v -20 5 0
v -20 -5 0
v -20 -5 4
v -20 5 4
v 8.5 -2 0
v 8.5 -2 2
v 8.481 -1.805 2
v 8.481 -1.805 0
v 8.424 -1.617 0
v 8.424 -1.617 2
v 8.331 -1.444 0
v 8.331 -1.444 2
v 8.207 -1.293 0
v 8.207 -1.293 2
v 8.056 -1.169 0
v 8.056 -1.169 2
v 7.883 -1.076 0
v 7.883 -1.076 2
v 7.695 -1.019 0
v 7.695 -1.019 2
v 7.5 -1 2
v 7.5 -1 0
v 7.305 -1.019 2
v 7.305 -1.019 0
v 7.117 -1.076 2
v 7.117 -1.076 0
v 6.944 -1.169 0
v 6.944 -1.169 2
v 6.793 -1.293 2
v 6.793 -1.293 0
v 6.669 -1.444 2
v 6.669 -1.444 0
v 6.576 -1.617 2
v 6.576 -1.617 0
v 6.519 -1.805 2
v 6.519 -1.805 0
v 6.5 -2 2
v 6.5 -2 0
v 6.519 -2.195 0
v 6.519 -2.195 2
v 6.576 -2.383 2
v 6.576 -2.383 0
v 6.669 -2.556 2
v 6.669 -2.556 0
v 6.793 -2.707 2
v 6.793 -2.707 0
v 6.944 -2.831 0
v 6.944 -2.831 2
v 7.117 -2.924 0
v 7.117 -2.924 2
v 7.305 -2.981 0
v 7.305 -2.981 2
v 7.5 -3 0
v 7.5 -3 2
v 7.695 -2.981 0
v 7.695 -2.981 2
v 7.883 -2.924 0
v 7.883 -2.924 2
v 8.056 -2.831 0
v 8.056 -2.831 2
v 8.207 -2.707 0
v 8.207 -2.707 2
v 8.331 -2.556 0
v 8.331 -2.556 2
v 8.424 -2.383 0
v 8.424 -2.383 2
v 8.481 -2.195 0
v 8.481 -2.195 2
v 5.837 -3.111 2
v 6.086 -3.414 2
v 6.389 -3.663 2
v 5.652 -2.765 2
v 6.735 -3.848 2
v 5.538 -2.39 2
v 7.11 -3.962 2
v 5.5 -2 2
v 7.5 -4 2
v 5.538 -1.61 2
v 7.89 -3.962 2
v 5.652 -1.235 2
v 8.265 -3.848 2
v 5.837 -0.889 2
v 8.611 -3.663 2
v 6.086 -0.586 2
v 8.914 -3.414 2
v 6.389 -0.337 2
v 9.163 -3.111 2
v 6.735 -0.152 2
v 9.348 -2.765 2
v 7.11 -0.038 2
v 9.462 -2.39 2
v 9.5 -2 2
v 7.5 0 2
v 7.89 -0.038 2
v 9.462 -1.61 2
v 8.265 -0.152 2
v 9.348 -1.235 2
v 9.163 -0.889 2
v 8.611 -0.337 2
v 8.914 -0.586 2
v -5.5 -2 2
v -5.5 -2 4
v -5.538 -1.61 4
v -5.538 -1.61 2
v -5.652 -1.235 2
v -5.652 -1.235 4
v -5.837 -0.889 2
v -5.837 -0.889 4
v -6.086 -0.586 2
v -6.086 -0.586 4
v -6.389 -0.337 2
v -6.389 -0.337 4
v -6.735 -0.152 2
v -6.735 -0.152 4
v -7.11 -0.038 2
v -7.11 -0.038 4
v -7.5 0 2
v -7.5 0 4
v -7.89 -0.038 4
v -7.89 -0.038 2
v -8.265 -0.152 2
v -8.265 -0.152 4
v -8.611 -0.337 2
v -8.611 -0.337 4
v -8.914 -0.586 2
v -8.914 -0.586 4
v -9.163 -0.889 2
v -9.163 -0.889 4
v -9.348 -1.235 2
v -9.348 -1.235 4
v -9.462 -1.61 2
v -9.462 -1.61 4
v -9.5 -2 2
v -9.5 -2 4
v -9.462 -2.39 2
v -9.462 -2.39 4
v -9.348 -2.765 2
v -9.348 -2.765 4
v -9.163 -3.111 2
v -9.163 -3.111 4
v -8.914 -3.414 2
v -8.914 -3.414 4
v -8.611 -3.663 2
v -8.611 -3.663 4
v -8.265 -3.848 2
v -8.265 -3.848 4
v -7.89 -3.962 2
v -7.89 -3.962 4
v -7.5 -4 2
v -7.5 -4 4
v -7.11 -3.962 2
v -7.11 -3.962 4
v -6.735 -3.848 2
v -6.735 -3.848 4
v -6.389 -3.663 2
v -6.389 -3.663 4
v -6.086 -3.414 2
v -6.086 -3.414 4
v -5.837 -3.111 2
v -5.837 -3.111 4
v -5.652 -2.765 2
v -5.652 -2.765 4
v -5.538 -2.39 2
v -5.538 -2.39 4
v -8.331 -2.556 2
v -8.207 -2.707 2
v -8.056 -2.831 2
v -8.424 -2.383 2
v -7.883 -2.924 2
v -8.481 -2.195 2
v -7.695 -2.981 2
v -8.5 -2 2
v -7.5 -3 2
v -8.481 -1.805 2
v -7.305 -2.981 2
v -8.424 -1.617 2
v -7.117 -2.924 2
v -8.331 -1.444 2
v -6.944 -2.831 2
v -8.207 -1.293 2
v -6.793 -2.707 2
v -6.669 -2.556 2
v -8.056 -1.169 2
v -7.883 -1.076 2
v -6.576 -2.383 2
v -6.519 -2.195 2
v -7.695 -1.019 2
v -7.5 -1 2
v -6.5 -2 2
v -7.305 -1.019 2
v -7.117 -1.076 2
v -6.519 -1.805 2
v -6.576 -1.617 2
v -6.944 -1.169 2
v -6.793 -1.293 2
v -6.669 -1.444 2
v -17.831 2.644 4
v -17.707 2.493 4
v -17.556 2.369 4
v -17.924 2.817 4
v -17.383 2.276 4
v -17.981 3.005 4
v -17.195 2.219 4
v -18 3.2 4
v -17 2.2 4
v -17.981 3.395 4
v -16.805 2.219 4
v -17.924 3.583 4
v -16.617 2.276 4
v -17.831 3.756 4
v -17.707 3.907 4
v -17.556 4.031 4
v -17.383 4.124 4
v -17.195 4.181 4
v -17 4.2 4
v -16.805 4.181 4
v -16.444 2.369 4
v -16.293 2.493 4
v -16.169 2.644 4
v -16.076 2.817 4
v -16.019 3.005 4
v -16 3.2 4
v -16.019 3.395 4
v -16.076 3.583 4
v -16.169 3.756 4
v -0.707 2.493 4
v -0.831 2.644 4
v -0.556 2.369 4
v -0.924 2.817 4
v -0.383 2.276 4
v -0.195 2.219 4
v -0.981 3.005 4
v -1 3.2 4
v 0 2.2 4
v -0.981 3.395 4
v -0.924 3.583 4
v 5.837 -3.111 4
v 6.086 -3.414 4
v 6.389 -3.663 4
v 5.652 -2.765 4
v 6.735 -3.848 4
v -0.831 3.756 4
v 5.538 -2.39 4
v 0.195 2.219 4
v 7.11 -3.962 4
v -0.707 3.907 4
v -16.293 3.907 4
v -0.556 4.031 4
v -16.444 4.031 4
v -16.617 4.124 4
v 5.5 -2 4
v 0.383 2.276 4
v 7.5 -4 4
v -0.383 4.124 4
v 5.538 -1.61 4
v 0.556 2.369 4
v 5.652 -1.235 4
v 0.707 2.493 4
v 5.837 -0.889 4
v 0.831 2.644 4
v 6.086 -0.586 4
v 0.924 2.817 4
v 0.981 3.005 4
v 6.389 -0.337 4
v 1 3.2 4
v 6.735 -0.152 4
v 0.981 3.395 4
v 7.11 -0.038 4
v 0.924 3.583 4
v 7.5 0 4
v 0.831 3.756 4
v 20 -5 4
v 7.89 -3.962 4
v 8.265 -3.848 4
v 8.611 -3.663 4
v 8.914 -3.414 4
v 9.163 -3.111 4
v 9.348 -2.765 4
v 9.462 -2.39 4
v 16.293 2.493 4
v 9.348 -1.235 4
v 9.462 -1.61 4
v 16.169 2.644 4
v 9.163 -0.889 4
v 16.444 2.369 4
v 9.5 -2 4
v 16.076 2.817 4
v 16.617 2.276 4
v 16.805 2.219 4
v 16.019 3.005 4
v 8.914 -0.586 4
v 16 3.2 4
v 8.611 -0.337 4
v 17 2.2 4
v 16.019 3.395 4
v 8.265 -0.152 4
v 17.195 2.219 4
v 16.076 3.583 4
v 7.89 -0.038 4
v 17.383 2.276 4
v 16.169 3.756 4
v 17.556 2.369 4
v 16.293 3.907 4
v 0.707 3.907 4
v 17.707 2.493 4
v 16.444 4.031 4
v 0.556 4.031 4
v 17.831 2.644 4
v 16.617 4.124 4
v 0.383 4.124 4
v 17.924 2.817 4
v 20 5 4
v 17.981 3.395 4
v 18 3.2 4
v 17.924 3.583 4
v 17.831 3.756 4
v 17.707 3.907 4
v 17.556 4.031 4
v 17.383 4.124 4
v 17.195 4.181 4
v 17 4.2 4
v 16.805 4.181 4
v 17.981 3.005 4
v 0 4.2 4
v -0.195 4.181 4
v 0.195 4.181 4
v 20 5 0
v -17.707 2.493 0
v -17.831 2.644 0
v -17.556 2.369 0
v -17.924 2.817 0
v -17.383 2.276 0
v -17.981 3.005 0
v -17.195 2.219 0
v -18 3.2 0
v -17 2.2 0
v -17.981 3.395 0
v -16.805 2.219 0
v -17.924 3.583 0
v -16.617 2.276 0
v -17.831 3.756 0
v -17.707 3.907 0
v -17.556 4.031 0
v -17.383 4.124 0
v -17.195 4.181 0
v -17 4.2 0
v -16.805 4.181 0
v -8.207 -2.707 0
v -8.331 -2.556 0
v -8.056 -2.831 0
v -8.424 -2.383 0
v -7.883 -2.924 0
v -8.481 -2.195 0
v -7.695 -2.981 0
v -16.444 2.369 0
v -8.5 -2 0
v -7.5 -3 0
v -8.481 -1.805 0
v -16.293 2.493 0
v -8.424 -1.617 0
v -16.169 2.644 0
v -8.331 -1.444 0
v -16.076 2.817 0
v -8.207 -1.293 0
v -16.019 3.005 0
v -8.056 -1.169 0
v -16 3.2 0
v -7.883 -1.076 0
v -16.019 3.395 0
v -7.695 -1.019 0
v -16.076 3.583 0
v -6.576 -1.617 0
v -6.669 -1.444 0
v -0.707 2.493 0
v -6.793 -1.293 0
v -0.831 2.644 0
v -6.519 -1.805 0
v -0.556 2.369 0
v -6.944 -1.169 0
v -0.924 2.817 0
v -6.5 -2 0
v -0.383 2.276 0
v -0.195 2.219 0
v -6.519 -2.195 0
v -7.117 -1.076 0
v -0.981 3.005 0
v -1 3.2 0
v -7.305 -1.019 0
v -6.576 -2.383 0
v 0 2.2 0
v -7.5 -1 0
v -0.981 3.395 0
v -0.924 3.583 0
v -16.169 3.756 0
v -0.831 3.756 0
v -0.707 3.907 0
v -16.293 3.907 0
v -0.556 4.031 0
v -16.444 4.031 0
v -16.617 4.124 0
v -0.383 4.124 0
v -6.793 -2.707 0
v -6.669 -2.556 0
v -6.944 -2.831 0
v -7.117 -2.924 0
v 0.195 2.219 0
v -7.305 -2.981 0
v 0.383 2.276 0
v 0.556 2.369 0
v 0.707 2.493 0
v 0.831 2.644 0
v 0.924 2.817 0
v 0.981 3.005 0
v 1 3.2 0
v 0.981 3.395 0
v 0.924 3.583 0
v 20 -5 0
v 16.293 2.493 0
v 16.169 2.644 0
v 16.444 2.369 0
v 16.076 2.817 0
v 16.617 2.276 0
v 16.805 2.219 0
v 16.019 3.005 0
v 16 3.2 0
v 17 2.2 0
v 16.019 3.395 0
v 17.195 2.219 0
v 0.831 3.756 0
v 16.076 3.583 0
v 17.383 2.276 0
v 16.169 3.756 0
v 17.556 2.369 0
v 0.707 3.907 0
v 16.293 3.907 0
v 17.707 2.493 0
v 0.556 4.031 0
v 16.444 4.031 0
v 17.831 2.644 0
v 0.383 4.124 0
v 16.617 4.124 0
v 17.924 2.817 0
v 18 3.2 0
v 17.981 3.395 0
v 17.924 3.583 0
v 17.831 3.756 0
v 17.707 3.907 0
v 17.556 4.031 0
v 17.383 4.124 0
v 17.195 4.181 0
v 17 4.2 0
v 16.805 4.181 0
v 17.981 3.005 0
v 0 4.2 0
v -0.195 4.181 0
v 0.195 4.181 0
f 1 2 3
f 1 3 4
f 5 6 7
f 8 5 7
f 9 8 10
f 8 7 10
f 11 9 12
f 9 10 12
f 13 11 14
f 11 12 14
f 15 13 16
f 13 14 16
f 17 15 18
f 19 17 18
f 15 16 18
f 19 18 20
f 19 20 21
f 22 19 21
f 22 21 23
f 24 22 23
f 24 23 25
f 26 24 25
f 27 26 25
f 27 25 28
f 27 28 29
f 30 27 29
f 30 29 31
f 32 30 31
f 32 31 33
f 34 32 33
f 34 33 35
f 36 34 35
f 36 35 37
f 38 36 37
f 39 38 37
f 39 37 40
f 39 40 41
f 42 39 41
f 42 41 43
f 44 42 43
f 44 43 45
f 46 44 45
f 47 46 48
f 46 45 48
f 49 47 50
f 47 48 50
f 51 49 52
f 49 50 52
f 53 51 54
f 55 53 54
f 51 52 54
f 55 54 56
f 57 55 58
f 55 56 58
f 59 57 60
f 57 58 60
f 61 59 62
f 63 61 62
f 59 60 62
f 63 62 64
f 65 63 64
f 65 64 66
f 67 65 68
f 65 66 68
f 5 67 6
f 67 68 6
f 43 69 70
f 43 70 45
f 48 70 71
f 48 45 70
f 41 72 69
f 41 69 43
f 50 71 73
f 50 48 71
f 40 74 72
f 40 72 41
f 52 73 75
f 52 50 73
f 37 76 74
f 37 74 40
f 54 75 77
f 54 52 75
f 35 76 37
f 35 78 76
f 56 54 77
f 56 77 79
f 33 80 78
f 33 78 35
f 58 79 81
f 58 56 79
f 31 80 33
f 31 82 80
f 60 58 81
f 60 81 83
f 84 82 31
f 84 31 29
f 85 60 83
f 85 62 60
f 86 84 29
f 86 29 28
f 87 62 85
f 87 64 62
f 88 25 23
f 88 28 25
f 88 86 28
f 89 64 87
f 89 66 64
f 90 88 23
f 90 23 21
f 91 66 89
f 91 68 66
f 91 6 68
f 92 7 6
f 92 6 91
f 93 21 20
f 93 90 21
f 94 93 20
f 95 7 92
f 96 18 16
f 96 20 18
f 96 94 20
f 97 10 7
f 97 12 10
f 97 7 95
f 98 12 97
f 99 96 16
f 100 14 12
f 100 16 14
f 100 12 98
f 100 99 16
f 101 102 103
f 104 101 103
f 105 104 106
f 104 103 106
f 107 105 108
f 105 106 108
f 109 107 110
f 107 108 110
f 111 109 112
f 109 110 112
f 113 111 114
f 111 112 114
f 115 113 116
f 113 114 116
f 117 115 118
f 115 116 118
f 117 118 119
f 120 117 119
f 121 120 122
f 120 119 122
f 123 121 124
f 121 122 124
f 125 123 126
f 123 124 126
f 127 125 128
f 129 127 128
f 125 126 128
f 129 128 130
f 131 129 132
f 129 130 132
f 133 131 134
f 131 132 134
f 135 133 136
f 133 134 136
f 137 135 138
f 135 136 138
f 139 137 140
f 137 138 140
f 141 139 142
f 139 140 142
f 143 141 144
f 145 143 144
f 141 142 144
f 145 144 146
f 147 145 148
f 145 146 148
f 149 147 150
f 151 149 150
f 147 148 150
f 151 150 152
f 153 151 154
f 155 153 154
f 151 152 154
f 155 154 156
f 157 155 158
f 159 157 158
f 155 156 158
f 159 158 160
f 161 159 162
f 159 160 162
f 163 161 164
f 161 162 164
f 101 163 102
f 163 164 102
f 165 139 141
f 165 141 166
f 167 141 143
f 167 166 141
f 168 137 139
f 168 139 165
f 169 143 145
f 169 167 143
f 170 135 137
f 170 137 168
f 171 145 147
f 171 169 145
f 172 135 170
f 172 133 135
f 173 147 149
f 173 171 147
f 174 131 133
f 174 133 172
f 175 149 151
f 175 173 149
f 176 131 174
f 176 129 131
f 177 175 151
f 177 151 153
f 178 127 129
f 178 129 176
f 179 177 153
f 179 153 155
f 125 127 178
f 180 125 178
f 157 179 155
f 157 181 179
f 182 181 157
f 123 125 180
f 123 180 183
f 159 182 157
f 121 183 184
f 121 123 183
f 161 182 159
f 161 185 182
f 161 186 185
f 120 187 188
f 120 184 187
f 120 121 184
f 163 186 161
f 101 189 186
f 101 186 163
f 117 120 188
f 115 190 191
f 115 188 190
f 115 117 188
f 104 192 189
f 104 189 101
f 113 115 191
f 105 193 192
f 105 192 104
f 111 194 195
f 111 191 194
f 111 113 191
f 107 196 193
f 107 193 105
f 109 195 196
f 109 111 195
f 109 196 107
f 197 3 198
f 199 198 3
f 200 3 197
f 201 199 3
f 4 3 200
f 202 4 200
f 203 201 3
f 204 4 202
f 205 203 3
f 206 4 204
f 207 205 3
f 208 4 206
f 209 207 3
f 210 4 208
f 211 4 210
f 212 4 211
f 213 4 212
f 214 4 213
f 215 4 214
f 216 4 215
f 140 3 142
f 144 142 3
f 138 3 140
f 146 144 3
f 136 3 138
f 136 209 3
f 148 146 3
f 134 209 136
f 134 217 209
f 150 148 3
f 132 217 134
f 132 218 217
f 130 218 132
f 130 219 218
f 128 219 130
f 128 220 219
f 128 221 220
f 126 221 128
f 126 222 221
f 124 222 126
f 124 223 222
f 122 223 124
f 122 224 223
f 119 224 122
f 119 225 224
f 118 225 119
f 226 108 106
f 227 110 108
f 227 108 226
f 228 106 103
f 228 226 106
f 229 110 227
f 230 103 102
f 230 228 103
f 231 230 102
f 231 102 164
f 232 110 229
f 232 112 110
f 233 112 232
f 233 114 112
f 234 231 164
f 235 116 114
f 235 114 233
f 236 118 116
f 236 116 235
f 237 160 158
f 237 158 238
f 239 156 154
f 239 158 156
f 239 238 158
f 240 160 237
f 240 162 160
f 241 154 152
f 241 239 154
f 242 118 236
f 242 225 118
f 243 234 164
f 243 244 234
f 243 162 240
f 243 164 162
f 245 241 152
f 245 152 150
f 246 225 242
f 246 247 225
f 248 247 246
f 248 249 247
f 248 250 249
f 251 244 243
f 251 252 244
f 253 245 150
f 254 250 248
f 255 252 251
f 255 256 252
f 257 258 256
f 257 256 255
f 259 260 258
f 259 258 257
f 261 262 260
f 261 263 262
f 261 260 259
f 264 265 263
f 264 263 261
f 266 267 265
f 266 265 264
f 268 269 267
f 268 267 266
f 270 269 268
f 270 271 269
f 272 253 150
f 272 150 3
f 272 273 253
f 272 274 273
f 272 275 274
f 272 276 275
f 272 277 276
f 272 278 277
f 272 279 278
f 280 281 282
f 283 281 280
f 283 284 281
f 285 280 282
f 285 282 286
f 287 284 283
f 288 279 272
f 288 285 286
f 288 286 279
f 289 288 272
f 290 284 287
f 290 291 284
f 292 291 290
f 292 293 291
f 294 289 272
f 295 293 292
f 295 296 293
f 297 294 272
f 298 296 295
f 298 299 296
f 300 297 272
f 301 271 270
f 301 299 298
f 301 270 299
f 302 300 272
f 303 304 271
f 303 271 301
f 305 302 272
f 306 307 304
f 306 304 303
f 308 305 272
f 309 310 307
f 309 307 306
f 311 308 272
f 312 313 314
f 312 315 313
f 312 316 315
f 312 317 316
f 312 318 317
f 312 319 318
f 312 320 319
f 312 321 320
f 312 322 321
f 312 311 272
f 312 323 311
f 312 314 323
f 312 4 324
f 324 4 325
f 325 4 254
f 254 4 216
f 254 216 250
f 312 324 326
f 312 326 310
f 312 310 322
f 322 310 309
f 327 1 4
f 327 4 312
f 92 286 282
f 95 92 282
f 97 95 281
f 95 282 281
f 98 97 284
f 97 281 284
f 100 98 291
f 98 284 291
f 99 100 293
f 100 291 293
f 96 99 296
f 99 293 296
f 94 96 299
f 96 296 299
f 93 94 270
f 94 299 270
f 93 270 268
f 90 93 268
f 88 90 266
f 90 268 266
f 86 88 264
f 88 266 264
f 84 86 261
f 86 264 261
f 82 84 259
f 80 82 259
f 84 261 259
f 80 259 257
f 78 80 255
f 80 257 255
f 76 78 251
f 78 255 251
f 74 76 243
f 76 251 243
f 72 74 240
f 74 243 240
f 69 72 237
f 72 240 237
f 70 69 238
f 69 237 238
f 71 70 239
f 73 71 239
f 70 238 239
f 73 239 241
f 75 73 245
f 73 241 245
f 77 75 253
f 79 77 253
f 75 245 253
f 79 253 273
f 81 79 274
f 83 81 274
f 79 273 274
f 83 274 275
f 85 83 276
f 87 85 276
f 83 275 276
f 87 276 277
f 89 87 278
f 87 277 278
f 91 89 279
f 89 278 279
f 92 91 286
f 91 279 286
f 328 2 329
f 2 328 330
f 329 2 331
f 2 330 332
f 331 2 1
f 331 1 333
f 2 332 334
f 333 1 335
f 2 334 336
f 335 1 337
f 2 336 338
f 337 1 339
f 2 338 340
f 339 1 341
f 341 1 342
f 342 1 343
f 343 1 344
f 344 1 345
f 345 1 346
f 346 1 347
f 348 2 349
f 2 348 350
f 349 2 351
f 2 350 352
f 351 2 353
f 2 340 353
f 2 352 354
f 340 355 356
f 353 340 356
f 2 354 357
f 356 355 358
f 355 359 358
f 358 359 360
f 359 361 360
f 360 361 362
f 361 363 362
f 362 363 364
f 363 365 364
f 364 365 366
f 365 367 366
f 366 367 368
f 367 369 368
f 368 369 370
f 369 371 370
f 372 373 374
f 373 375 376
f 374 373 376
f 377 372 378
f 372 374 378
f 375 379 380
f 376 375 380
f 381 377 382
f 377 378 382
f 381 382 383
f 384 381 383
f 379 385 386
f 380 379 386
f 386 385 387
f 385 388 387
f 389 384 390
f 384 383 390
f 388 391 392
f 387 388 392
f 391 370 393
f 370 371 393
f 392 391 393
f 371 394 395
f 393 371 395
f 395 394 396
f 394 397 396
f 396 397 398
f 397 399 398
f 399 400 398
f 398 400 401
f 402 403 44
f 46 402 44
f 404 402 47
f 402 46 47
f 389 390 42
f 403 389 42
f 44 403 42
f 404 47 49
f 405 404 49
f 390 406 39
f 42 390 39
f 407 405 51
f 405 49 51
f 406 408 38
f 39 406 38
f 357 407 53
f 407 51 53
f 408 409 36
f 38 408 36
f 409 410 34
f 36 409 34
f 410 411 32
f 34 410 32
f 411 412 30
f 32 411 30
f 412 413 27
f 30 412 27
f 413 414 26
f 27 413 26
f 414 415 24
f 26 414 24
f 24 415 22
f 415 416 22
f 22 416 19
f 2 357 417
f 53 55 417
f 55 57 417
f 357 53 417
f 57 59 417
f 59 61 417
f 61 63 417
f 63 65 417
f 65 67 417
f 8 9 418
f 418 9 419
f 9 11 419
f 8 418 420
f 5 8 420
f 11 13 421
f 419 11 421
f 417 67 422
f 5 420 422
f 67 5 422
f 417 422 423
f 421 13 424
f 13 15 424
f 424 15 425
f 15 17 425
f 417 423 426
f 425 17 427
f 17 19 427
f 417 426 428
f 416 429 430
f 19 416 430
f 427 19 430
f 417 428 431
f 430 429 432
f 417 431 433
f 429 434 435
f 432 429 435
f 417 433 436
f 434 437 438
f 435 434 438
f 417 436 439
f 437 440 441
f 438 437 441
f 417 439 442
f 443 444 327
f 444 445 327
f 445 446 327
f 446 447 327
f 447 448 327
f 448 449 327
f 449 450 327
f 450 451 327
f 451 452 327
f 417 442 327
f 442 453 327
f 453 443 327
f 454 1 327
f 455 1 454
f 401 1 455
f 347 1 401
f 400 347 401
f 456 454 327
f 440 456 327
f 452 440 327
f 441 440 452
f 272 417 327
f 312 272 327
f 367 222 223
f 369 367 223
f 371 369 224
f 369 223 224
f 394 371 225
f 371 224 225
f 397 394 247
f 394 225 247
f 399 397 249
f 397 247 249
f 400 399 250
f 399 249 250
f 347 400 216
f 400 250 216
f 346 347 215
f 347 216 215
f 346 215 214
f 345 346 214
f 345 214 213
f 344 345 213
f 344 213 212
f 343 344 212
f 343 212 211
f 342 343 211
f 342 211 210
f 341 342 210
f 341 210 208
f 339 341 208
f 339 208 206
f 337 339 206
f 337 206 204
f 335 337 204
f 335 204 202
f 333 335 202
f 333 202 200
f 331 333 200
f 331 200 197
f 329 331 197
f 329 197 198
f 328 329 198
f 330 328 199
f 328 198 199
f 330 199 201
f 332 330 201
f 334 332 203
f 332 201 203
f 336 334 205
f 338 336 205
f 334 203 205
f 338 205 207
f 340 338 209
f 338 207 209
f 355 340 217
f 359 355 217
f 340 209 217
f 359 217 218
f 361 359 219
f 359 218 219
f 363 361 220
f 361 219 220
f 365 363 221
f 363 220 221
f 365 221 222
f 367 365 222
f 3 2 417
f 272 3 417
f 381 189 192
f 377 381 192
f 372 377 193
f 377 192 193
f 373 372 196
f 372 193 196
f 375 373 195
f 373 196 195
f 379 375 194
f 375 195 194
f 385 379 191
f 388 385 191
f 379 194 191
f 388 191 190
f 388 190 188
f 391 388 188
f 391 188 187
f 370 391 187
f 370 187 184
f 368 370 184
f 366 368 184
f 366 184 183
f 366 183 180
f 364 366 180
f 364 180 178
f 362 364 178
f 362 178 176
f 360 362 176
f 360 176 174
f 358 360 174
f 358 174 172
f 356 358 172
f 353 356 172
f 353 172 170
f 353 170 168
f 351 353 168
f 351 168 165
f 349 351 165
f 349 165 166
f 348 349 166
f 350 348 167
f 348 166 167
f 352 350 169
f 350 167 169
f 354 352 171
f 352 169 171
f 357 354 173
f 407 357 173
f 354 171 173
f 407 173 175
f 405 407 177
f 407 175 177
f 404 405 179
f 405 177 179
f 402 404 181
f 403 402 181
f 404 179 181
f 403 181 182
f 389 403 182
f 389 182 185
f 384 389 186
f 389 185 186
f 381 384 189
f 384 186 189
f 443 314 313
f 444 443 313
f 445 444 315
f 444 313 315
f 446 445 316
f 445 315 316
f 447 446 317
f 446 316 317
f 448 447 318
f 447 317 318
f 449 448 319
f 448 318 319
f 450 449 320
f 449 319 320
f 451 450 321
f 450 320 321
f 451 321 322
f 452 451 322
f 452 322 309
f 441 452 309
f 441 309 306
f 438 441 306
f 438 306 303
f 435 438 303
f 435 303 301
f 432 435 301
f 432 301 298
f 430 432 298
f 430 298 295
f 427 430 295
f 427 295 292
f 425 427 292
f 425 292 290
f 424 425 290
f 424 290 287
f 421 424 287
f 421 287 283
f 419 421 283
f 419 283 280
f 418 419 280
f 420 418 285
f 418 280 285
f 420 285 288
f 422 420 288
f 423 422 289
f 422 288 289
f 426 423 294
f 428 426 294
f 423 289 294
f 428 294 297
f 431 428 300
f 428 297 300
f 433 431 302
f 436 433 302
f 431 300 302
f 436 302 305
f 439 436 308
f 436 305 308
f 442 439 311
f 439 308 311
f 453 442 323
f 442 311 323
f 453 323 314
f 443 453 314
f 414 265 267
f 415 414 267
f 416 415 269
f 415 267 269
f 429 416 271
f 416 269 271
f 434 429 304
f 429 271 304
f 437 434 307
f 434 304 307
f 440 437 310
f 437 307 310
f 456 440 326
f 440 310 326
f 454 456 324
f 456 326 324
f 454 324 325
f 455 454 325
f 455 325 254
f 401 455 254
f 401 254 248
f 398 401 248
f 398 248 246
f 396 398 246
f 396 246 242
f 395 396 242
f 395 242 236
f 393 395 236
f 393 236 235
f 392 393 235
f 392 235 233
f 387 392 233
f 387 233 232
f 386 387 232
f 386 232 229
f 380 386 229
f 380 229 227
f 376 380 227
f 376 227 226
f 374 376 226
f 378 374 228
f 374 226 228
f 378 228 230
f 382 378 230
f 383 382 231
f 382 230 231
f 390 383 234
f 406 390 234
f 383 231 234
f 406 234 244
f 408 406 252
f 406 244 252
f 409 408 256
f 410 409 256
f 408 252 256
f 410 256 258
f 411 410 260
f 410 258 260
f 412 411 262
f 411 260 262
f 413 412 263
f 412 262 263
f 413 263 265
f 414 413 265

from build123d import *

# Parameters (mm, degrees)
SKETCH2_W           = 40
SKETCH2_H           = 10
BOSS_EXTRUDE1_DEPTH = 4
SKETCH3_R           = 1
CUT_EXTRUDE1_DEPTH  = 22
SKETCH4_R           = 2
CUT_EXTRUDE2_DEPTH  = 2


with BuildPart() as part:
    # Sketch2 → Boss-Extrude1 (new body)
    with BuildSketch(Plane.XY):
        Rectangle(SKETCH2_W, SKETCH2_H)
    extrude(amount=BOSS_EXTRUDE1_DEPTH)

    # Sketch3 → Cut-Extrude1 (cut, through all)
    with BuildSketch(Plane.XY.offset(4)):
        with Locations((-17, 3.2)):
            Circle(SKETCH3_R)
        with Locations((0, 3.2)):
            Circle(SKETCH3_R)
        with Locations((17, 3.2)):
            Circle(SKETCH3_R)
        with Locations((-7.5, -2)):
            Circle(SKETCH3_R)
        with Locations((7.5, -2)):
            Circle(SKETCH3_R)
    extrude(amount=-CUT_EXTRUDE1_DEPTH, mode=Mode.SUBTRACT)

    # Sketch4 → Cut-Extrude2 (cut)
    with BuildSketch(Plane.XY.offset(4)):
        with Locations((-7.5, -2)):
            Circle(SKETCH4_R)
        with Locations((7.5, -2)):
            Circle(SKETCH4_R)
    extrude(amount=-CUT_EXTRUDE2_DEPTH, mode=Mode.SUBTRACT)


solid = part.part
